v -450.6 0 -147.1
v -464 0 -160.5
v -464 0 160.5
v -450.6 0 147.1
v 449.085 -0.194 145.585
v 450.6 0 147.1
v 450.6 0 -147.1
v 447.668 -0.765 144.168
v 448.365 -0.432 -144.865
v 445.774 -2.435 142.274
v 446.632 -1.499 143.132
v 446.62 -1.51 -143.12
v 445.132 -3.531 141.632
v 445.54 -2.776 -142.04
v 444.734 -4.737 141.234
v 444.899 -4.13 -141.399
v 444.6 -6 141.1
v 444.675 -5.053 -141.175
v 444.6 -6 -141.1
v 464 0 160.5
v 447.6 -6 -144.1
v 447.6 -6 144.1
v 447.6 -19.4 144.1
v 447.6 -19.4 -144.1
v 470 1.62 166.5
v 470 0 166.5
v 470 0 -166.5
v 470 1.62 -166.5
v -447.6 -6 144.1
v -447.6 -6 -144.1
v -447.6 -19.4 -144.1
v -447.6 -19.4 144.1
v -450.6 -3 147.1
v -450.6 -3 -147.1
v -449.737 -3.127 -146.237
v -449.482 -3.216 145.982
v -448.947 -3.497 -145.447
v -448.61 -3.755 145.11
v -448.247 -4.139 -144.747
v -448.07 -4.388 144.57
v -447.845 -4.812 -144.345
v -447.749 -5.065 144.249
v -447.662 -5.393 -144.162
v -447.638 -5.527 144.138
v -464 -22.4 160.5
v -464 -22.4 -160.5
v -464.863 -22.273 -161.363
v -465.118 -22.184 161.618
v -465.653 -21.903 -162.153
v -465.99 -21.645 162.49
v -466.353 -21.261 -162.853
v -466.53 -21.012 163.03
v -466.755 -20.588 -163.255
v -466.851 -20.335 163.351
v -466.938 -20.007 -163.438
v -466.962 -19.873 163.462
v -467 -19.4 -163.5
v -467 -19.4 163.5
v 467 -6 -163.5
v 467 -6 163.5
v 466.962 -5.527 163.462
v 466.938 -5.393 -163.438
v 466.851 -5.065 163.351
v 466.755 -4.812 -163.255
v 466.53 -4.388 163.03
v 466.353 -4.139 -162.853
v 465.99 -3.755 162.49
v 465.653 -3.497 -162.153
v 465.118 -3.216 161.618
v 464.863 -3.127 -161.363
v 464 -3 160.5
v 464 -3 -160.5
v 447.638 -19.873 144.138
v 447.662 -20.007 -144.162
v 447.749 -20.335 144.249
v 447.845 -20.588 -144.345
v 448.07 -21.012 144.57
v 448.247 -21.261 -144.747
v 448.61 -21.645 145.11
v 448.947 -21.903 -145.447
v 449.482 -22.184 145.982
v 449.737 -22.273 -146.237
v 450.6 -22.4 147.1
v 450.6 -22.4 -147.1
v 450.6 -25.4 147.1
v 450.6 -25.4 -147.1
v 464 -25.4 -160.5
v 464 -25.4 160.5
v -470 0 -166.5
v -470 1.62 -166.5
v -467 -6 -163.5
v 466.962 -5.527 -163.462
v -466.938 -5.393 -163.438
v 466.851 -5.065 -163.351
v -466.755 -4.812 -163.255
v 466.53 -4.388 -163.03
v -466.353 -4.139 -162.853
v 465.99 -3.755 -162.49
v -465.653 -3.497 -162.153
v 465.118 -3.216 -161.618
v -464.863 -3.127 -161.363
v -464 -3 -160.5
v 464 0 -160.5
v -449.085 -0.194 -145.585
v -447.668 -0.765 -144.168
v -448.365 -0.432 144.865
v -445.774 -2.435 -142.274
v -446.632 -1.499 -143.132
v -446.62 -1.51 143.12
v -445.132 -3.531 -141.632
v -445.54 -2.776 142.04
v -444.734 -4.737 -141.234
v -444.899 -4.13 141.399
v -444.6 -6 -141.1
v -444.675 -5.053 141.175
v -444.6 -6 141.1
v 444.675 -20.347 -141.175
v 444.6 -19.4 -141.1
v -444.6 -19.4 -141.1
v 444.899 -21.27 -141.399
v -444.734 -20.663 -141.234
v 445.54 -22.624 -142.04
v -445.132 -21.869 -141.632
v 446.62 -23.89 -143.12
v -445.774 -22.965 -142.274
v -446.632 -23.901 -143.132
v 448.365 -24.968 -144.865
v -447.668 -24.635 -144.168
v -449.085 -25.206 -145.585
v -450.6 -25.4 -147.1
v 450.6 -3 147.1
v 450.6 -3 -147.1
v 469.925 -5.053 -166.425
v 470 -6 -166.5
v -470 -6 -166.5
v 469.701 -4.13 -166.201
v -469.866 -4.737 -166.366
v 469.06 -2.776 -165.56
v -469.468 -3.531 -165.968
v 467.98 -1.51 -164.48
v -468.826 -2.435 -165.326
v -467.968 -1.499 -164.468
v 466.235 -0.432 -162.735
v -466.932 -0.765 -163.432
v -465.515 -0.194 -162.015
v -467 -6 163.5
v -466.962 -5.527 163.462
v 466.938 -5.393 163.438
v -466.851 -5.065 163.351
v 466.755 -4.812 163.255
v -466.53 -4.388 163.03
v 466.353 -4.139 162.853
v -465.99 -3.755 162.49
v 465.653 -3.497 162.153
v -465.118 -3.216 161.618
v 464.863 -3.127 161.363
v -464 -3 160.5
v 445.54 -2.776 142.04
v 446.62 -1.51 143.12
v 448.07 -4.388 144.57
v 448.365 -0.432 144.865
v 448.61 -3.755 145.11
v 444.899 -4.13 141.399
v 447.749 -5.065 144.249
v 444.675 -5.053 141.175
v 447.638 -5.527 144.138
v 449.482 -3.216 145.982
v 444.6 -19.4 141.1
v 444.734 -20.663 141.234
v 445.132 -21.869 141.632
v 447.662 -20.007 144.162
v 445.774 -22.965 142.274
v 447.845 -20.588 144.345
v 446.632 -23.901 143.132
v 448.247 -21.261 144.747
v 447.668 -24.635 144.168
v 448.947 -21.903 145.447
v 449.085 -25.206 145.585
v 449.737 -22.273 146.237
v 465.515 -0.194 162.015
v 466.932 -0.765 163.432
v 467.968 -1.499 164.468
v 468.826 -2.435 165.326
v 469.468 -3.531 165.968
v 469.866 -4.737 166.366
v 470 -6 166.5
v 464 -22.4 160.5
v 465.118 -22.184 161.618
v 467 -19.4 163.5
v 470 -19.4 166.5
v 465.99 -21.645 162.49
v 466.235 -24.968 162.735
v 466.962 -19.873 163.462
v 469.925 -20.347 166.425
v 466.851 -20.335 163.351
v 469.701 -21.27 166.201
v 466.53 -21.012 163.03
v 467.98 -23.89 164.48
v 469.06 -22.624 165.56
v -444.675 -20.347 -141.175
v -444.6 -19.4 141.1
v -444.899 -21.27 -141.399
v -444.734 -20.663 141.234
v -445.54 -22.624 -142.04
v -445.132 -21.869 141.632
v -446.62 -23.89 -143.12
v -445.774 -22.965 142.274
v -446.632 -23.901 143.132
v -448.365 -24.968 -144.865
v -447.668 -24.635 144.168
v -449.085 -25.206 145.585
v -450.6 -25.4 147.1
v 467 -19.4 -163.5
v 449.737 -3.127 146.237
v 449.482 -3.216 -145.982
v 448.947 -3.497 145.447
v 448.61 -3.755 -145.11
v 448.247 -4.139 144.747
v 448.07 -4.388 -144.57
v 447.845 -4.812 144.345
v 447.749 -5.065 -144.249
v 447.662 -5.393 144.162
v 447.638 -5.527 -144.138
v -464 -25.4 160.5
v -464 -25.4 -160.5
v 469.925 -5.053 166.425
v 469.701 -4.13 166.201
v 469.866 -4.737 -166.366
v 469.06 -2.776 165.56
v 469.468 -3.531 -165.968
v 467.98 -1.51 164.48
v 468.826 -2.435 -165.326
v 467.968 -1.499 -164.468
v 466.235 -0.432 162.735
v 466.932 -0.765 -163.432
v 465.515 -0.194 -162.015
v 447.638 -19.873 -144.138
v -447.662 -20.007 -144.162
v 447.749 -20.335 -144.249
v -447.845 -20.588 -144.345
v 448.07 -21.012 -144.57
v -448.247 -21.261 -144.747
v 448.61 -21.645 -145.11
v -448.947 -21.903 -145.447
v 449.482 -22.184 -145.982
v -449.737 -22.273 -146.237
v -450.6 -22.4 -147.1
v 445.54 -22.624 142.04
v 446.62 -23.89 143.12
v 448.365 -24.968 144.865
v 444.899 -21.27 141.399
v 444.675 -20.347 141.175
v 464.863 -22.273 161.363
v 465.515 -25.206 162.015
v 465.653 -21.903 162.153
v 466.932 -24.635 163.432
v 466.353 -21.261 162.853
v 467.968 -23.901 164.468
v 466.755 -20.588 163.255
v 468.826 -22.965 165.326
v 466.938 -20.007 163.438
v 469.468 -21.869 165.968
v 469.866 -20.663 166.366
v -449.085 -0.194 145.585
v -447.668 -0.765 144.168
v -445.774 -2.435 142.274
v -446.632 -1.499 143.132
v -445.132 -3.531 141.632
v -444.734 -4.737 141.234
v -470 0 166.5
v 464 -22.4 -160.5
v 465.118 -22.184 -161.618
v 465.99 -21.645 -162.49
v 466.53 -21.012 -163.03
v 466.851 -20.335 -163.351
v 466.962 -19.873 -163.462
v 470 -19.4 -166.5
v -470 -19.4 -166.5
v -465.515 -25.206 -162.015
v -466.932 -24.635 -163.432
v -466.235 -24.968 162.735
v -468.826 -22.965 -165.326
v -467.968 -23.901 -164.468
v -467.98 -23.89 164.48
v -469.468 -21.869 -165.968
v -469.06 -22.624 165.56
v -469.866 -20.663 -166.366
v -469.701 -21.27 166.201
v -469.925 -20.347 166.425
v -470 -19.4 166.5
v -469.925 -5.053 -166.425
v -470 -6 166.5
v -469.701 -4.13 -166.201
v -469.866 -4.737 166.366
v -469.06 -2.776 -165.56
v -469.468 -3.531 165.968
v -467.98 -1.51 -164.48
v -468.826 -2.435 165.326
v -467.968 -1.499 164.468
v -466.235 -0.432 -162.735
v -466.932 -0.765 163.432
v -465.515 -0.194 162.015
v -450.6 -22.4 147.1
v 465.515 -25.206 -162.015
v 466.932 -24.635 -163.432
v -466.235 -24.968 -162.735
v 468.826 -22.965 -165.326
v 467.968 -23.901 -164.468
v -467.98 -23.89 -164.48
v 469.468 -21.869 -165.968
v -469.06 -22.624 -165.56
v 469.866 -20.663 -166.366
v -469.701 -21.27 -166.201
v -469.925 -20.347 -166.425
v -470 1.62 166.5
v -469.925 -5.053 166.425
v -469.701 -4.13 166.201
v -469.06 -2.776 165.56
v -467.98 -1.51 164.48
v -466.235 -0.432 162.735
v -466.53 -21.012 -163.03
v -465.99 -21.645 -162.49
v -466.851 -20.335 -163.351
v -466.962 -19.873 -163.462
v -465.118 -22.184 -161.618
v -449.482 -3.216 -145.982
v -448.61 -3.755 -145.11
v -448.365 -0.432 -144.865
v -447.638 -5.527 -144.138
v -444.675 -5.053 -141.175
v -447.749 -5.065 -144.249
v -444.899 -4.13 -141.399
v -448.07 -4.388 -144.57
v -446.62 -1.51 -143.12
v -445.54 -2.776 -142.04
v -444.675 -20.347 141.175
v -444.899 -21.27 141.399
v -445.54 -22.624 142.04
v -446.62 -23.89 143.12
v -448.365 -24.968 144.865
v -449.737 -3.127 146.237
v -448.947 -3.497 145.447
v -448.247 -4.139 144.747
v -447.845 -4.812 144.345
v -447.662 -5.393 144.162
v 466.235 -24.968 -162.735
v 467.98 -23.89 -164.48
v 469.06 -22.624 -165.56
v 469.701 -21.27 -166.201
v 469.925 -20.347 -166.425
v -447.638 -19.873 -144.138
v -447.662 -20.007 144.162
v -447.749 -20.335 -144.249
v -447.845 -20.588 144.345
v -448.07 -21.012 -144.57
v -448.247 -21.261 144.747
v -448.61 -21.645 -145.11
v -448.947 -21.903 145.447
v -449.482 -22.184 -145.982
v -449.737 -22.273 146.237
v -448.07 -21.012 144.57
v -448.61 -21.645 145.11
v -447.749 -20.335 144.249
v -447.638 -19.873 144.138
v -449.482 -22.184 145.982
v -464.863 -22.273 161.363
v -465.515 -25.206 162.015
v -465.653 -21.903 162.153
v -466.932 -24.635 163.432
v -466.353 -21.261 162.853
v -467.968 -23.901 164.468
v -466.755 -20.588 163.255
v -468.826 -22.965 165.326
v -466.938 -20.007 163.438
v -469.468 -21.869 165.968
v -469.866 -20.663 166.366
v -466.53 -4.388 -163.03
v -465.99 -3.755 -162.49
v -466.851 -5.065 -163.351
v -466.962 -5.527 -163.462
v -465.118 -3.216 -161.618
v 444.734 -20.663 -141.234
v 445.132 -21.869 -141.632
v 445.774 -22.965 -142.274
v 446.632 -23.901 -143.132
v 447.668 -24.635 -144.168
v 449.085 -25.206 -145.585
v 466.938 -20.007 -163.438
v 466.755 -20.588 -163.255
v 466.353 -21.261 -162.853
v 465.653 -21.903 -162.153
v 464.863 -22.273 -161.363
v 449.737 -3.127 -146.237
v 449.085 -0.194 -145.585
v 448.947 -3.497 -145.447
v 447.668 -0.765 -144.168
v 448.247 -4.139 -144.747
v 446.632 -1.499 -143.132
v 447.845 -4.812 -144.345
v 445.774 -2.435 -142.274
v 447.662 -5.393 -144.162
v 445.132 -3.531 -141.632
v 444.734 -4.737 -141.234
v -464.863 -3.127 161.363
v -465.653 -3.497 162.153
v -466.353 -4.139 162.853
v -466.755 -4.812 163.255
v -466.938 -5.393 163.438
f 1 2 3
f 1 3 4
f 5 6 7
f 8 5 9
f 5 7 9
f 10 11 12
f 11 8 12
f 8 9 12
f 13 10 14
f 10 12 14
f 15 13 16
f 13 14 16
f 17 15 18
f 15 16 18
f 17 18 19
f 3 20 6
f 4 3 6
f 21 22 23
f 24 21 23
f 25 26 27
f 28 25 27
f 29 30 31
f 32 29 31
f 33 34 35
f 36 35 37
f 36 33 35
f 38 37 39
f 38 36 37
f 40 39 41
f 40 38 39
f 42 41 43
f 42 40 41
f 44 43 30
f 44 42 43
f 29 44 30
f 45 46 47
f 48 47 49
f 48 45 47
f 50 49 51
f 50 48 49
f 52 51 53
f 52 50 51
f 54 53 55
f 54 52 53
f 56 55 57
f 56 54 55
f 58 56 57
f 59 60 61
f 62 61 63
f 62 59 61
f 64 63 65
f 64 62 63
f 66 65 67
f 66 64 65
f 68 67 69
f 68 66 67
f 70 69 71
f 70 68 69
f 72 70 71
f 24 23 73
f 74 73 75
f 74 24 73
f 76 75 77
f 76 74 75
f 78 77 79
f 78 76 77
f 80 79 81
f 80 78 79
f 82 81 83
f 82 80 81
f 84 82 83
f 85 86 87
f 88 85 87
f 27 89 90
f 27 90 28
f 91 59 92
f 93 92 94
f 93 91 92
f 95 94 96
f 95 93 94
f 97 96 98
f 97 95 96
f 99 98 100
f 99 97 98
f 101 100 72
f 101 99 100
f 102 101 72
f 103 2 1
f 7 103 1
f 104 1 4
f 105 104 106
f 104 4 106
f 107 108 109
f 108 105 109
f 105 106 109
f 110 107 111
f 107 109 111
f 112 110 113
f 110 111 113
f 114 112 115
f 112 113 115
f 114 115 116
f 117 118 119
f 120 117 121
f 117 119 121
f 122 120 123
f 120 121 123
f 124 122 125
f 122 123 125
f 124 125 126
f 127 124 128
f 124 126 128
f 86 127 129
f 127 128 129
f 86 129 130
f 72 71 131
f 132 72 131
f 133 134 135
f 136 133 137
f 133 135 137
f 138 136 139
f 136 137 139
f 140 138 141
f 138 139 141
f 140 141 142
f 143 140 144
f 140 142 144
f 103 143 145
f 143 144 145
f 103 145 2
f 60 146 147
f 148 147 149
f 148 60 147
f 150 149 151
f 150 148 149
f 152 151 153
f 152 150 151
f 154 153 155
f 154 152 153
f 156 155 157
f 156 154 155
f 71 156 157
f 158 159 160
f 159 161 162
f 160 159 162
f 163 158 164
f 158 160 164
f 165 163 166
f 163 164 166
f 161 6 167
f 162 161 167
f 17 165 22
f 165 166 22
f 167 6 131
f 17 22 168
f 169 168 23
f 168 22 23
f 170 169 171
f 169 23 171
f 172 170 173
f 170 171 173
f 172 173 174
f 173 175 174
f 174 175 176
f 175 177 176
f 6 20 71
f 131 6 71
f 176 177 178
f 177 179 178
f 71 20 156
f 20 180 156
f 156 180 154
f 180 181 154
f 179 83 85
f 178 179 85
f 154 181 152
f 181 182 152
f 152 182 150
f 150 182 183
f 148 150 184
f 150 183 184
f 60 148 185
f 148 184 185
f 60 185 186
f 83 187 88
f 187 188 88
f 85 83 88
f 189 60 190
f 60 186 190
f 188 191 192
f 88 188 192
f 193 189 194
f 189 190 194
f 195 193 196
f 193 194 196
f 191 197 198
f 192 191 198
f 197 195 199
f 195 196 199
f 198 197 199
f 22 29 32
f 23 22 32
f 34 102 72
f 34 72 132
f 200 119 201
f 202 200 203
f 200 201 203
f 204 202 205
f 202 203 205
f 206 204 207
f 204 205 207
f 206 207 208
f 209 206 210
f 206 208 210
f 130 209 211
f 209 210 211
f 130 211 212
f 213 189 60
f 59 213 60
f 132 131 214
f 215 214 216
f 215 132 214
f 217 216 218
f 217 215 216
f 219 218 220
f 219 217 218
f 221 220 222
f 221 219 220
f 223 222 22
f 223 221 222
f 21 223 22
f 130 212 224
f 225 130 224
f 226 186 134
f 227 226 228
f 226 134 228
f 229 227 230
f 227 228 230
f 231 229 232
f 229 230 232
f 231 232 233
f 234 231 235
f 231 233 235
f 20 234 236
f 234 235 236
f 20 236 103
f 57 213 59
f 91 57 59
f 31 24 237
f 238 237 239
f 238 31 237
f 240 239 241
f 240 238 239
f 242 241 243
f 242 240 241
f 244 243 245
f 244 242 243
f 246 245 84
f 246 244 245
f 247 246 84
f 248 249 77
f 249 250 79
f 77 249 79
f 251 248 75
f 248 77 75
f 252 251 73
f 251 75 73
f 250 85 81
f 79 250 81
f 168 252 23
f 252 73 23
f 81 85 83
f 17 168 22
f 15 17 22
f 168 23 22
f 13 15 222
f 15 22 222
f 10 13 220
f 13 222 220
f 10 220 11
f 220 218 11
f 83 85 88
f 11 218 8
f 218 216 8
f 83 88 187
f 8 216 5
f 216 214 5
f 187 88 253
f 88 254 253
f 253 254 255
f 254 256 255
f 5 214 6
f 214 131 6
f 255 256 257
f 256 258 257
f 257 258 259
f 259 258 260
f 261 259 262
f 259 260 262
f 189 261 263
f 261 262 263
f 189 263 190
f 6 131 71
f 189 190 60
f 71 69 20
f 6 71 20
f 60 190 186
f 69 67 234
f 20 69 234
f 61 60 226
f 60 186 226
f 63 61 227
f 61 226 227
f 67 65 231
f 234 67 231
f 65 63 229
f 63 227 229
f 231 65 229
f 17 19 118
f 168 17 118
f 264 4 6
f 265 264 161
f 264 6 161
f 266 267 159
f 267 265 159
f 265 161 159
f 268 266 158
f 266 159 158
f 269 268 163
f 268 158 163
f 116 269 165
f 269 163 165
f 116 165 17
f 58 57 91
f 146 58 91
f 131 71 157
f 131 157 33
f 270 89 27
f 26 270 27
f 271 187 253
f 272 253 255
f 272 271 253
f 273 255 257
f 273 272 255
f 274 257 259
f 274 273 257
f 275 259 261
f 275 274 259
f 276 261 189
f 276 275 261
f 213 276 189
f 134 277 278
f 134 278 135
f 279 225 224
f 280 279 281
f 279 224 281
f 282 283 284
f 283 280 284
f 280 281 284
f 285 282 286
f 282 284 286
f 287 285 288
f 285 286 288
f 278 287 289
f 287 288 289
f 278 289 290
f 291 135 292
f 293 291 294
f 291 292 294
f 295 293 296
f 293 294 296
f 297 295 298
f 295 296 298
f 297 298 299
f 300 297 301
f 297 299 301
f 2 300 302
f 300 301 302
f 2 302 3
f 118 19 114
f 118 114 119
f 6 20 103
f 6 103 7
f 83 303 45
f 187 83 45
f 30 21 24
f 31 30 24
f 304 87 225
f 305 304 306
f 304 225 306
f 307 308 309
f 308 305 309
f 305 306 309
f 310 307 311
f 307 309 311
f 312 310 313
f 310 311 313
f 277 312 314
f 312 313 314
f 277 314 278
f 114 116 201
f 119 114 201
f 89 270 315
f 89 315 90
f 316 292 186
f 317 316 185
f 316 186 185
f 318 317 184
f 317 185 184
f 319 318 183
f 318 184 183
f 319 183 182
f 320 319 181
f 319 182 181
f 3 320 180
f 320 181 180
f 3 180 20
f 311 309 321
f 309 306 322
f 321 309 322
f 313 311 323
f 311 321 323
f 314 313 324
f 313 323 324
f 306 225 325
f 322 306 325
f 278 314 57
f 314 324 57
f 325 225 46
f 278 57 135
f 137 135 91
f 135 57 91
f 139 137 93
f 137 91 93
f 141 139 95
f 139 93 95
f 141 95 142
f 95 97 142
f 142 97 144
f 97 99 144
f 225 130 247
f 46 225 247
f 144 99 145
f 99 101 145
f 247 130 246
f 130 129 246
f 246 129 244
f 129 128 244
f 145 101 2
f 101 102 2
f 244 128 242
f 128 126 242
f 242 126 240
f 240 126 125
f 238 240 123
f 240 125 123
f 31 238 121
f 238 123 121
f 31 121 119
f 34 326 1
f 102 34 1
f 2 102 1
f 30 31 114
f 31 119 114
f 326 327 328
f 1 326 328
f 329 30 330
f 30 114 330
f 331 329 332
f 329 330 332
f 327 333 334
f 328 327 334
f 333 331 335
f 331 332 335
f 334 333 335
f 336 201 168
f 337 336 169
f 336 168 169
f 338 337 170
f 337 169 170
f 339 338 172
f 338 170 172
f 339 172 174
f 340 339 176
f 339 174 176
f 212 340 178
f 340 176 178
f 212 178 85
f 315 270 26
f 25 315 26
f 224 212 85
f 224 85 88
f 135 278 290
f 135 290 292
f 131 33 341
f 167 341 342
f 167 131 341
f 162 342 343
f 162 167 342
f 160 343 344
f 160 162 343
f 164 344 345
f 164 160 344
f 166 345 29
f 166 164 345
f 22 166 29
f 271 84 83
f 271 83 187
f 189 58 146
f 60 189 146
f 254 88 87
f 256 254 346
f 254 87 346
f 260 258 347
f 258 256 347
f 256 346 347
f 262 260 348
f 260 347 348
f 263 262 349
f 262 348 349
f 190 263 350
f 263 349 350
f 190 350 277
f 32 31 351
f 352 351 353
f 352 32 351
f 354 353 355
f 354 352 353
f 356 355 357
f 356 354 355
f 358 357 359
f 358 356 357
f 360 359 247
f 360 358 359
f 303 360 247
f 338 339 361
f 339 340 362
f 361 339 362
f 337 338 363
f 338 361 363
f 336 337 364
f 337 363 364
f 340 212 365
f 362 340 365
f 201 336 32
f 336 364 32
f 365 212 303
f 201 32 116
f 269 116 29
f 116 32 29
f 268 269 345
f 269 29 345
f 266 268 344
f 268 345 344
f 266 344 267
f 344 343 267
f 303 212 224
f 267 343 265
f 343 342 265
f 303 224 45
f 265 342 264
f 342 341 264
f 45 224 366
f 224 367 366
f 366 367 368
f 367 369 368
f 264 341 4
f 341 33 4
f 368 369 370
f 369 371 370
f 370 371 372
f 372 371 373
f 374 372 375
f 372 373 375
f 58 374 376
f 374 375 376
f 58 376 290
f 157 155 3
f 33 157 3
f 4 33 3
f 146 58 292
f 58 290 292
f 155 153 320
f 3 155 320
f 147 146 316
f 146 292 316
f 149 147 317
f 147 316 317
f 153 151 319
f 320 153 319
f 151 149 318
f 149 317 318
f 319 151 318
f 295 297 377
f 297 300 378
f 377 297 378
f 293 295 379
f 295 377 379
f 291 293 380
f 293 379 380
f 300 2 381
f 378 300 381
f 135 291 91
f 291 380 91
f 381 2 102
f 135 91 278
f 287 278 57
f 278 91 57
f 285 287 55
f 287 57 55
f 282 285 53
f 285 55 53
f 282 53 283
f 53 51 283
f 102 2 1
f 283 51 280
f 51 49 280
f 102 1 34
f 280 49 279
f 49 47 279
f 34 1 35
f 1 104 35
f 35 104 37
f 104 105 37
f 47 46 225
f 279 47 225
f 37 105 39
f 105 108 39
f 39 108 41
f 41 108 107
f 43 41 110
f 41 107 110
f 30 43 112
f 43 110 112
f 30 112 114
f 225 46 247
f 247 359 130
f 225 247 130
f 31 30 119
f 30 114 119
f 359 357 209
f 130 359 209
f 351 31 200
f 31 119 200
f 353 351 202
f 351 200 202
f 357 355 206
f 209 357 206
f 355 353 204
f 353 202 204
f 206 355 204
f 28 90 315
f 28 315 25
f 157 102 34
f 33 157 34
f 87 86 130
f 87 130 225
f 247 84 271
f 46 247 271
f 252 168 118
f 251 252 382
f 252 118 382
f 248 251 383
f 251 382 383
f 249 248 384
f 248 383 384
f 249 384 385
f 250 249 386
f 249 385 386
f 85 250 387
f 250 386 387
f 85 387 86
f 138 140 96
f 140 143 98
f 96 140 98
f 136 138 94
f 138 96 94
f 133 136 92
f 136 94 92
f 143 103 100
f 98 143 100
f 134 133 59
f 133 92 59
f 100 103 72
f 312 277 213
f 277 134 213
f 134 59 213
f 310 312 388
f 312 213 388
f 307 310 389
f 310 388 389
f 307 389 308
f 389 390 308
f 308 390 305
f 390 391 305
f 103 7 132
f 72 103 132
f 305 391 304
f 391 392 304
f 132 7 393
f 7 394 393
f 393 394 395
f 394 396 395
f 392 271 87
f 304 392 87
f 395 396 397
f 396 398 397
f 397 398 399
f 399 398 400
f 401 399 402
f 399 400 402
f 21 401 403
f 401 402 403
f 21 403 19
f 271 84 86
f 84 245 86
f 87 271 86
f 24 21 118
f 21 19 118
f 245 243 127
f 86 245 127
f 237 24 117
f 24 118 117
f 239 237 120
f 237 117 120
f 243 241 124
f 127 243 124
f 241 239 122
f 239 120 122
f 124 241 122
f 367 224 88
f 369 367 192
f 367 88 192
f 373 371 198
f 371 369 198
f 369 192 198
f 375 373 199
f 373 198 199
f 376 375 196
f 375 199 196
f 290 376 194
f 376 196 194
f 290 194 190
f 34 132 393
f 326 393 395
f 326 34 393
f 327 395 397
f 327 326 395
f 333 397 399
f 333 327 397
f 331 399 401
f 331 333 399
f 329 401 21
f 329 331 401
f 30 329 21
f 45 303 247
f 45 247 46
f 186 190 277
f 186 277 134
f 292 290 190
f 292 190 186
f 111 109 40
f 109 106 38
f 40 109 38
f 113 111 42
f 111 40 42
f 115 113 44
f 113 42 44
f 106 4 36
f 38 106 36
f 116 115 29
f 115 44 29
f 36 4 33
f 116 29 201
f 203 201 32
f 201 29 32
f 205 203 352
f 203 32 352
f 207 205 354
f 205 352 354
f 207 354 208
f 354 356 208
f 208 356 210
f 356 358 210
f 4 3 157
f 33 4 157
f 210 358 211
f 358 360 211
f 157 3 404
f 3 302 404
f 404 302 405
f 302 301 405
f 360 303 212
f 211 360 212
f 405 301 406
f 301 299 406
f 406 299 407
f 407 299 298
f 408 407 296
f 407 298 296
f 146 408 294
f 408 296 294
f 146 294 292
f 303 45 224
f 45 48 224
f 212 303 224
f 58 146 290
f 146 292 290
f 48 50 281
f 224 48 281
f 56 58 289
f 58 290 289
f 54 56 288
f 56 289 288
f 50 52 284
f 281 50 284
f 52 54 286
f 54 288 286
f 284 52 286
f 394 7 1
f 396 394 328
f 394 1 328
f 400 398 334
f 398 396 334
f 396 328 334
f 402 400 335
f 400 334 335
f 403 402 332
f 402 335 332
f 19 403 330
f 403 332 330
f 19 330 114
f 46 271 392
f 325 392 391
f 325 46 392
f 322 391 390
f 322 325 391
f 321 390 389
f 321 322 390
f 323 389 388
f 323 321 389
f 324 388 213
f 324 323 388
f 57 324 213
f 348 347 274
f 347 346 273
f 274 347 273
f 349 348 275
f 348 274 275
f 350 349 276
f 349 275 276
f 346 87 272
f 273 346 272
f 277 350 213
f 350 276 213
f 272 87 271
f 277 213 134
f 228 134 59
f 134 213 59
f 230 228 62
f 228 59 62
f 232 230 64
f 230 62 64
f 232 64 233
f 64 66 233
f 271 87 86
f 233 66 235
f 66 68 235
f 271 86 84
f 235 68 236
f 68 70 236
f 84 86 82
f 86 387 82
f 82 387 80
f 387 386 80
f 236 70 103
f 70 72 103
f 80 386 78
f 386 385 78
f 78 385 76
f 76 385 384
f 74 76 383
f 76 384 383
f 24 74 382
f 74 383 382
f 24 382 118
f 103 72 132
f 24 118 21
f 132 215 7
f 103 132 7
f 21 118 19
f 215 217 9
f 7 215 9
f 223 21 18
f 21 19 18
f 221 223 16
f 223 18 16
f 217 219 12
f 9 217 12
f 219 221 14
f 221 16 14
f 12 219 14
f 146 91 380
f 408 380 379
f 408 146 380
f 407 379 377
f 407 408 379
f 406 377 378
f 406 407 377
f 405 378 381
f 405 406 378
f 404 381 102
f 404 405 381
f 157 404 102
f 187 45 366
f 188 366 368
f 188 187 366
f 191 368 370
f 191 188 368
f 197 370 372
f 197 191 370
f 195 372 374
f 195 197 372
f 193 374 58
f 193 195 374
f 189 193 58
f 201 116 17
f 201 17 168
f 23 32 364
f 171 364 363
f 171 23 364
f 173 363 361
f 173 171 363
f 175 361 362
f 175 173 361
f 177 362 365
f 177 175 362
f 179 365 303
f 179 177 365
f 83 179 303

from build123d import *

# Parameters (mm, degrees)
TUBO_CUADRADO_2_X_2_X_0_25_1_DEPTH      = 369.921024484
TUBO_CUADRADO_2_X_2_X_0_25_1_DEPTH_BACK = 36.921024484
TUBO_CUADRADO_2_X_2_X_0_25_1_2_DEPTH    = 1013.842048969
TUBO_CUADRADO_2_X_2_X_0_25_1_3_DEPTH    = 406.842048969
TUBO_CUADRADO_2_X_2_X_0_25_1_4_DEPTH    = 1013.842048969
CROQUIS3_W                              = 940
CROQUIS3_H                              = 333
SALIENTE_EXTRUIR2_DEPTH                 = 1.62


with BuildPart() as part:
    # Sketch1 → Tubo cuadrado 2 X 2 X 0.25(1) (new, two sides: drawn at the far end of the back side and taken through both)
    with BuildSketch(Plane(origin=(457.3, -12.7, -166.5), x_dir=(1, 0, 0), z_dir=(0, 0, 1)).offset(-TUBO_CUADRADO_2_X_2_X_0_25_1_DEPTH_BACK)):
        with BuildLine():
            Line((-6.7, -12.7), (6.7, -12.7))
            ThreePointArc((6.7, -12.7), (10.942640687, -10.942640687), (12.7, -6.7))
            Line((12.7, -6.7), (12.7, 6.7))
            ThreePointArc((12.7, 6.7), (10.942640687, 10.942640687), (6.7, 12.7))
            Line((6.7, 12.7), (-6.7, 12.7))
            ThreePointArc((-6.7, 12.7), (-10.942640687, 10.942640687), (-12.7, 6.7))
            Line((-12.7, 6.7), (-12.7, -6.7))
            ThreePointArc((-12.7, -6.7), (-10.942640687, -10.942640687), (-6.7, -12.7))
        make_face()
        with BuildLine():
            Line((-6.7, -9.7), (6.7, -9.7))
            ThreePointArc((6.7, -9.7), (8.821320344, -8.821320344), (9.7, -6.7))
            Line((9.7, -6.7), (9.7, 6.7))
            ThreePointArc((9.7, 6.7), (8.821320344, 8.821320344), (6.7, 9.7))
            Line((6.7, 9.7), (-6.7, 9.7))
            ThreePointArc((-6.7, 9.7), (-8.821320344, 8.821320344), (-9.7, 6.7))
            Line((-9.7, 6.7), (-9.7, -6.7))
            ThreePointArc((-9.7, -6.7), (-8.821320344, -8.821320344), (-6.7, -9.7))
        make_face(mode=Mode.SUBTRACT)
    extrude(amount=TUBO_CUADRADO_2_X_2_X_0_25_1_DEPTH + TUBO_CUADRADO_2_X_2_X_0_25_1_DEPTH_BACK)

    # Tubo cuadrado 2 X 2 X 0.25(1) mitre 1
    split(bisect_by=Plane(origin=(470, 0, -166.5), x_dir=(0, 1, 0), z_dir=(0.707106781, 0, 0.707106781)), keep=Keep.TOP)

    # Tubo cuadrado 2 X 2 X 0.25(1) mitre 2
    split(bisect_by=Plane(origin=(470, 0, 166.5), x_dir=(0, 1, 0), z_dir=(0.707106781, 0, -0.707106781)), keep=Keep.TOP)


with BuildPart() as body_2:
    # Sketch1 on segment 2 (carried to segment 2) → Tubo cuadrado 2 X 2 X 0.25_1 2 (new body)
    with BuildSketch(Plane(origin=(506.921024484, -12.7, 153.8), x_dir=(0, 0, 1), z_dir=(-1, 0, 0))):
        with BuildLine():
            Line((-6.7, -12.7), (6.7, -12.7))
            ThreePointArc((6.7, -12.7), (10.942640687, -10.942640687), (12.7, -6.7))
            Line((12.7, -6.7), (12.7, 6.7))
            ThreePointArc((12.7, 6.7), (10.942640687, 10.942640687), (6.7, 12.7))
            Line((6.7, 12.7), (-6.7, 12.7))
            ThreePointArc((-6.7, 12.7), (-10.942640687, 10.942640687), (-12.7, 6.7))
            Line((-12.7, 6.7), (-12.7, -6.7))
            ThreePointArc((-12.7, -6.7), (-10.942640687, -10.942640687), (-6.7, -12.7))
        make_face()
        with BuildLine():
            Line((-6.7, -9.7), (6.7, -9.7))
            ThreePointArc((6.7, -9.7), (8.821320344, -8.821320344), (9.7, -6.7))
            Line((9.7, -6.7), (9.7, 6.7))
            ThreePointArc((9.7, 6.7), (8.821320344, 8.821320344), (6.7, 9.7))
            Line((6.7, 9.7), (-6.7, 9.7))
            ThreePointArc((-6.7, 9.7), (-8.821320344, 8.821320344), (-9.7, 6.7))
            Line((-9.7, 6.7), (-9.7, -6.7))
            ThreePointArc((-9.7, -6.7), (-8.821320344, -8.821320344), (-6.7, -9.7))
        make_face(mode=Mode.SUBTRACT)
    extrude(amount=TUBO_CUADRADO_2_X_2_X_0_25_1_2_DEPTH)

    # Tubo cuadrado 2 X 2 X 0.25_1 2 mitre 1
    split(bisect_by=Plane(origin=(-470, 0, 166.5), x_dir=(0, 1, 0), z_dir=(0.707106781, 0, 0.707106781)), keep=Keep.TOP)

    # Tubo cuadrado 2 X 2 X 0.25_1 2 mitre 2
    split(bisect_by=Plane(origin=(470, 0, 166.5), x_dir=(0, -1, 0), z_dir=(-0.707106781, 0, 0.707106781)), keep=Keep.TOP)


with BuildPart() as body_3:
    # Sketch1 on segment 3 (carried to segment 3) → Tubo cuadrado 2 X 2 X 0.25_1 3 (new body)
    with BuildSketch(Plane(origin=(-457.3, -12.7, 203.421024484), x_dir=(-1, 0, 0), z_dir=(0, 0, -1))):
        with BuildLine():
            Line((-6.7, -12.7), (6.7, -12.7))
            ThreePointArc((6.7, -12.7), (10.942640687, -10.942640687), (12.7, -6.7))
            Line((12.7, -6.7), (12.7, 6.7))
            ThreePointArc((12.7, 6.7), (10.942640687, 10.942640687), (6.7, 12.7))
            Line((6.7, 12.7), (-6.7, 12.7))
            ThreePointArc((-6.7, 12.7), (-10.942640687, 10.942640687), (-12.7, 6.7))
            Line((-12.7, 6.7), (-12.7, -6.7))
            ThreePointArc((-12.7, -6.7), (-10.942640687, -10.942640687), (-6.7, -12.7))
        make_face()
        with BuildLine():
            Line((-6.7, -9.7), (6.7, -9.7))
            ThreePointArc((6.7, -9.7), (8.821320344, -8.821320344), (9.7, -6.7))
            Line((9.7, -6.7), (9.7, 6.7))
            ThreePointArc((9.7, 6.7), (8.821320344, 8.821320344), (6.7, 9.7))
            Line((6.7, 9.7), (-6.7, 9.7))
            ThreePointArc((-6.7, 9.7), (-8.821320344, 8.821320344), (-9.7, 6.7))
            Line((-9.7, 6.7), (-9.7, -6.7))
            ThreePointArc((-9.7, -6.7), (-8.821320344, -8.821320344), (-6.7, -9.7))
        make_face(mode=Mode.SUBTRACT)
    extrude(amount=TUBO_CUADRADO_2_X_2_X_0_25_1_3_DEPTH)

    # Tubo cuadrado 2 X 2 X 0.25_1 3 mitre 1
    split(bisect_by=Plane(origin=(-470, 0, -166.5), x_dir=(0, -1, 0), z_dir=(-0.707106781, 0, 0.707106781)), keep=Keep.TOP)

    # Tubo cuadrado 2 X 2 X 0.25_1 3 mitre 2
    split(bisect_by=Plane(origin=(-470, 0, 166.5), x_dir=(0, -1, 0), z_dir=(-0.707106781, 0, -0.707106781)), keep=Keep.TOP)


with BuildPart() as body_4:
    # Sketch1 on segment 4 (carried to segment 4) → Tubo cuadrado 2 X 2 X 0.25_1 4 (new body)
    with BuildSketch(Plane(origin=(-506.921024484, -12.7, -153.8), x_dir=(0, 0, -1), z_dir=(1, 0, 0))):
        with BuildLine():
            Line((-6.7, -12.7), (6.7, -12.7))
            ThreePointArc((6.7, -12.7), (10.942640687, -10.942640687), (12.7, -6.7))
            Line((12.7, -6.7), (12.7, 6.7))
            ThreePointArc((12.7, 6.7), (10.942640687, 10.942640687), (6.7, 12.7))
            Line((6.7, 12.7), (-6.7, 12.7))
            ThreePointArc((-6.7, 12.7), (-10.942640687, 10.942640687), (-12.7, 6.7))
            Line((-12.7, 6.7), (-12.7, -6.7))
            ThreePointArc((-12.7, -6.7), (-10.942640687, -10.942640687), (-6.7, -12.7))
        make_face()
        with BuildLine():
            Line((-6.7, -9.7), (6.7, -9.7))
            ThreePointArc((6.7, -9.7), (8.821320344, -8.821320344), (9.7, -6.7))
            Line((9.7, -6.7), (9.7, 6.7))
            ThreePointArc((9.7, 6.7), (8.821320344, 8.821320344), (6.7, 9.7))
            Line((6.7, 9.7), (-6.7, 9.7))
            ThreePointArc((-6.7, 9.7), (-8.821320344, 8.821320344), (-9.7, 6.7))
            Line((-9.7, 6.7), (-9.7, -6.7))
            ThreePointArc((-9.7, -6.7), (-8.821320344, -8.821320344), (-6.7, -9.7))
        make_face(mode=Mode.SUBTRACT)
    extrude(amount=TUBO_CUADRADO_2_X_2_X_0_25_1_4_DEPTH)

    # Tubo cuadrado 2 X 2 X 0.25_1 4 mitre 1
    split(bisect_by=Plane(origin=(-470, 0, -166.5), x_dir=(0, 1, 0), z_dir=(0.707106781, 0, -0.707106781)), keep=Keep.TOP)

    # Tubo cuadrado 2 X 2 X 0.25_1 4 mitre 2
    split(bisect_by=Plane(origin=(470, 0, -166.5), x_dir=(0, -1, 0), z_dir=(-0.707106781, 0, -0.707106781)), keep=Keep.TOP)


with BuildPart() as body_5:
    # Croquis3 → Saliente-Extruir2 (new body)
    with BuildSketch(Plane(origin=(0, 0, 0), x_dir=(1, 0, 0), z_dir=(0, 1, 0))):
        Rectangle(CROQUIS3_W, CROQUIS3_H)
    extrude(amount=SALIENTE_EXTRUIR2_DEPTH)


solid = Compound([part.part, body_2.part, body_3.part, body_4.part, body_5.part])
